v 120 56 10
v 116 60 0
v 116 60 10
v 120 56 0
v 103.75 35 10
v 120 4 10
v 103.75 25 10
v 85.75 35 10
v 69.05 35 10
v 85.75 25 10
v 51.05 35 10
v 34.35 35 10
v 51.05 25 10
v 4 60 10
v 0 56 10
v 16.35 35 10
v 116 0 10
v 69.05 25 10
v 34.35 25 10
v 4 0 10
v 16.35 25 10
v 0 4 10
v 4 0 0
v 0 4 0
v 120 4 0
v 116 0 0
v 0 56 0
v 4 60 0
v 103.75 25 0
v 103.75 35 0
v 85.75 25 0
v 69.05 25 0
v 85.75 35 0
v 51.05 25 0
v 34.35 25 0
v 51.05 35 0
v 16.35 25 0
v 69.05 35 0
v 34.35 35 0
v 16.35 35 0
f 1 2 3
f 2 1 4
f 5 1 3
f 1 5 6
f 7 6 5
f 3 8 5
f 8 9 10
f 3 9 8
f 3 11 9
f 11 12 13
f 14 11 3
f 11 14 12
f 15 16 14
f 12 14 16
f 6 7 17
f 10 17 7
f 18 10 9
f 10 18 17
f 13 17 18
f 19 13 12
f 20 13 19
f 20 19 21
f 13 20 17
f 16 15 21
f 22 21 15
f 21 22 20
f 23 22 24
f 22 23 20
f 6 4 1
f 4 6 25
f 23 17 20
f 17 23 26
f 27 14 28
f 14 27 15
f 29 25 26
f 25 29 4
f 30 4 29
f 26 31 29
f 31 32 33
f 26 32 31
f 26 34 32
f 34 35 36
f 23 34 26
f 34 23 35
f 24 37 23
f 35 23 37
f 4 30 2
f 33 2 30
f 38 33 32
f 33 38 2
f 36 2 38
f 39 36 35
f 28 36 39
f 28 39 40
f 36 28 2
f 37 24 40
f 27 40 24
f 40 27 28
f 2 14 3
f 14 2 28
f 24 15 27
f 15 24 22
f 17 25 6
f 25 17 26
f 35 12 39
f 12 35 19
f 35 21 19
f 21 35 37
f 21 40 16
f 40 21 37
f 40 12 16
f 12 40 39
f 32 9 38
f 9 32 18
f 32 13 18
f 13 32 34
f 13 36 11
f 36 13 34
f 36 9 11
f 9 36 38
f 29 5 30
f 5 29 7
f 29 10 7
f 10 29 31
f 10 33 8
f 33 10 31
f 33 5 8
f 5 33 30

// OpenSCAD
$fn = 32;

// ----------------------------------------------------------------------
// Windowed plate: 3 voids, 120 x 60 x 10 mm
// ----------------------------------------------------------------------

// --- parameters (mm) ---
plate_l = 120;            // plate length, X
plate_w = 60;             // plate width, Y
plate_t = 10;             // plate thickness, Z
edge_margin = 8;          // wall from the plate edge to any window
windows = 3;              // number of windows in the row
win_l = 18;               // window length
win_w = 10;               // window width
win_pitch = 34.7;         // window pitch along X
depth_1 = 10;             // depth of void 1 (full thickness = through)
depth_2 = 10;             // depth of void 2 (full thickness = through)
depth_3 = 10;             // depth of void 3 (full thickness = through)
corner_c = 4;             // corner chamfer of the plate

profile = [[4, 0], [116, 0], [120, 4], [120, 56], [116, 60], [4, 60], [0, 56], [0, 4]];  // primary outline, 8 points, counter clockwise
void_1 = [[16.35, 25], [34.35, 25], [34.35, 35], [16.35, 35]];  // window 1 of the row, 4 points
void_2 = [[51.05, 25], [69.05, 25], [69.05, 35], [51.05, 35]];  // window 2 of the row, 4 points
void_3 = [[85.75, 25], [103.75, 25], [103.75, 35], [85.75, 35]];  // window 3 of the row, 4 points

// --- the one profile operation ---
difference() {
  linear_extrude(height = plate_t) polygon(points = profile);
  translate([0, 0, -1])
    linear_extrude(height = plate_t + 2) polygon(points = void_1);
  translate([0, 0, -1])
    linear_extrude(height = plate_t + 2) polygon(points = void_2);
  translate([0, 0, -1])
    linear_extrude(height = plate_t + 2) polygon(points = void_3);
}
